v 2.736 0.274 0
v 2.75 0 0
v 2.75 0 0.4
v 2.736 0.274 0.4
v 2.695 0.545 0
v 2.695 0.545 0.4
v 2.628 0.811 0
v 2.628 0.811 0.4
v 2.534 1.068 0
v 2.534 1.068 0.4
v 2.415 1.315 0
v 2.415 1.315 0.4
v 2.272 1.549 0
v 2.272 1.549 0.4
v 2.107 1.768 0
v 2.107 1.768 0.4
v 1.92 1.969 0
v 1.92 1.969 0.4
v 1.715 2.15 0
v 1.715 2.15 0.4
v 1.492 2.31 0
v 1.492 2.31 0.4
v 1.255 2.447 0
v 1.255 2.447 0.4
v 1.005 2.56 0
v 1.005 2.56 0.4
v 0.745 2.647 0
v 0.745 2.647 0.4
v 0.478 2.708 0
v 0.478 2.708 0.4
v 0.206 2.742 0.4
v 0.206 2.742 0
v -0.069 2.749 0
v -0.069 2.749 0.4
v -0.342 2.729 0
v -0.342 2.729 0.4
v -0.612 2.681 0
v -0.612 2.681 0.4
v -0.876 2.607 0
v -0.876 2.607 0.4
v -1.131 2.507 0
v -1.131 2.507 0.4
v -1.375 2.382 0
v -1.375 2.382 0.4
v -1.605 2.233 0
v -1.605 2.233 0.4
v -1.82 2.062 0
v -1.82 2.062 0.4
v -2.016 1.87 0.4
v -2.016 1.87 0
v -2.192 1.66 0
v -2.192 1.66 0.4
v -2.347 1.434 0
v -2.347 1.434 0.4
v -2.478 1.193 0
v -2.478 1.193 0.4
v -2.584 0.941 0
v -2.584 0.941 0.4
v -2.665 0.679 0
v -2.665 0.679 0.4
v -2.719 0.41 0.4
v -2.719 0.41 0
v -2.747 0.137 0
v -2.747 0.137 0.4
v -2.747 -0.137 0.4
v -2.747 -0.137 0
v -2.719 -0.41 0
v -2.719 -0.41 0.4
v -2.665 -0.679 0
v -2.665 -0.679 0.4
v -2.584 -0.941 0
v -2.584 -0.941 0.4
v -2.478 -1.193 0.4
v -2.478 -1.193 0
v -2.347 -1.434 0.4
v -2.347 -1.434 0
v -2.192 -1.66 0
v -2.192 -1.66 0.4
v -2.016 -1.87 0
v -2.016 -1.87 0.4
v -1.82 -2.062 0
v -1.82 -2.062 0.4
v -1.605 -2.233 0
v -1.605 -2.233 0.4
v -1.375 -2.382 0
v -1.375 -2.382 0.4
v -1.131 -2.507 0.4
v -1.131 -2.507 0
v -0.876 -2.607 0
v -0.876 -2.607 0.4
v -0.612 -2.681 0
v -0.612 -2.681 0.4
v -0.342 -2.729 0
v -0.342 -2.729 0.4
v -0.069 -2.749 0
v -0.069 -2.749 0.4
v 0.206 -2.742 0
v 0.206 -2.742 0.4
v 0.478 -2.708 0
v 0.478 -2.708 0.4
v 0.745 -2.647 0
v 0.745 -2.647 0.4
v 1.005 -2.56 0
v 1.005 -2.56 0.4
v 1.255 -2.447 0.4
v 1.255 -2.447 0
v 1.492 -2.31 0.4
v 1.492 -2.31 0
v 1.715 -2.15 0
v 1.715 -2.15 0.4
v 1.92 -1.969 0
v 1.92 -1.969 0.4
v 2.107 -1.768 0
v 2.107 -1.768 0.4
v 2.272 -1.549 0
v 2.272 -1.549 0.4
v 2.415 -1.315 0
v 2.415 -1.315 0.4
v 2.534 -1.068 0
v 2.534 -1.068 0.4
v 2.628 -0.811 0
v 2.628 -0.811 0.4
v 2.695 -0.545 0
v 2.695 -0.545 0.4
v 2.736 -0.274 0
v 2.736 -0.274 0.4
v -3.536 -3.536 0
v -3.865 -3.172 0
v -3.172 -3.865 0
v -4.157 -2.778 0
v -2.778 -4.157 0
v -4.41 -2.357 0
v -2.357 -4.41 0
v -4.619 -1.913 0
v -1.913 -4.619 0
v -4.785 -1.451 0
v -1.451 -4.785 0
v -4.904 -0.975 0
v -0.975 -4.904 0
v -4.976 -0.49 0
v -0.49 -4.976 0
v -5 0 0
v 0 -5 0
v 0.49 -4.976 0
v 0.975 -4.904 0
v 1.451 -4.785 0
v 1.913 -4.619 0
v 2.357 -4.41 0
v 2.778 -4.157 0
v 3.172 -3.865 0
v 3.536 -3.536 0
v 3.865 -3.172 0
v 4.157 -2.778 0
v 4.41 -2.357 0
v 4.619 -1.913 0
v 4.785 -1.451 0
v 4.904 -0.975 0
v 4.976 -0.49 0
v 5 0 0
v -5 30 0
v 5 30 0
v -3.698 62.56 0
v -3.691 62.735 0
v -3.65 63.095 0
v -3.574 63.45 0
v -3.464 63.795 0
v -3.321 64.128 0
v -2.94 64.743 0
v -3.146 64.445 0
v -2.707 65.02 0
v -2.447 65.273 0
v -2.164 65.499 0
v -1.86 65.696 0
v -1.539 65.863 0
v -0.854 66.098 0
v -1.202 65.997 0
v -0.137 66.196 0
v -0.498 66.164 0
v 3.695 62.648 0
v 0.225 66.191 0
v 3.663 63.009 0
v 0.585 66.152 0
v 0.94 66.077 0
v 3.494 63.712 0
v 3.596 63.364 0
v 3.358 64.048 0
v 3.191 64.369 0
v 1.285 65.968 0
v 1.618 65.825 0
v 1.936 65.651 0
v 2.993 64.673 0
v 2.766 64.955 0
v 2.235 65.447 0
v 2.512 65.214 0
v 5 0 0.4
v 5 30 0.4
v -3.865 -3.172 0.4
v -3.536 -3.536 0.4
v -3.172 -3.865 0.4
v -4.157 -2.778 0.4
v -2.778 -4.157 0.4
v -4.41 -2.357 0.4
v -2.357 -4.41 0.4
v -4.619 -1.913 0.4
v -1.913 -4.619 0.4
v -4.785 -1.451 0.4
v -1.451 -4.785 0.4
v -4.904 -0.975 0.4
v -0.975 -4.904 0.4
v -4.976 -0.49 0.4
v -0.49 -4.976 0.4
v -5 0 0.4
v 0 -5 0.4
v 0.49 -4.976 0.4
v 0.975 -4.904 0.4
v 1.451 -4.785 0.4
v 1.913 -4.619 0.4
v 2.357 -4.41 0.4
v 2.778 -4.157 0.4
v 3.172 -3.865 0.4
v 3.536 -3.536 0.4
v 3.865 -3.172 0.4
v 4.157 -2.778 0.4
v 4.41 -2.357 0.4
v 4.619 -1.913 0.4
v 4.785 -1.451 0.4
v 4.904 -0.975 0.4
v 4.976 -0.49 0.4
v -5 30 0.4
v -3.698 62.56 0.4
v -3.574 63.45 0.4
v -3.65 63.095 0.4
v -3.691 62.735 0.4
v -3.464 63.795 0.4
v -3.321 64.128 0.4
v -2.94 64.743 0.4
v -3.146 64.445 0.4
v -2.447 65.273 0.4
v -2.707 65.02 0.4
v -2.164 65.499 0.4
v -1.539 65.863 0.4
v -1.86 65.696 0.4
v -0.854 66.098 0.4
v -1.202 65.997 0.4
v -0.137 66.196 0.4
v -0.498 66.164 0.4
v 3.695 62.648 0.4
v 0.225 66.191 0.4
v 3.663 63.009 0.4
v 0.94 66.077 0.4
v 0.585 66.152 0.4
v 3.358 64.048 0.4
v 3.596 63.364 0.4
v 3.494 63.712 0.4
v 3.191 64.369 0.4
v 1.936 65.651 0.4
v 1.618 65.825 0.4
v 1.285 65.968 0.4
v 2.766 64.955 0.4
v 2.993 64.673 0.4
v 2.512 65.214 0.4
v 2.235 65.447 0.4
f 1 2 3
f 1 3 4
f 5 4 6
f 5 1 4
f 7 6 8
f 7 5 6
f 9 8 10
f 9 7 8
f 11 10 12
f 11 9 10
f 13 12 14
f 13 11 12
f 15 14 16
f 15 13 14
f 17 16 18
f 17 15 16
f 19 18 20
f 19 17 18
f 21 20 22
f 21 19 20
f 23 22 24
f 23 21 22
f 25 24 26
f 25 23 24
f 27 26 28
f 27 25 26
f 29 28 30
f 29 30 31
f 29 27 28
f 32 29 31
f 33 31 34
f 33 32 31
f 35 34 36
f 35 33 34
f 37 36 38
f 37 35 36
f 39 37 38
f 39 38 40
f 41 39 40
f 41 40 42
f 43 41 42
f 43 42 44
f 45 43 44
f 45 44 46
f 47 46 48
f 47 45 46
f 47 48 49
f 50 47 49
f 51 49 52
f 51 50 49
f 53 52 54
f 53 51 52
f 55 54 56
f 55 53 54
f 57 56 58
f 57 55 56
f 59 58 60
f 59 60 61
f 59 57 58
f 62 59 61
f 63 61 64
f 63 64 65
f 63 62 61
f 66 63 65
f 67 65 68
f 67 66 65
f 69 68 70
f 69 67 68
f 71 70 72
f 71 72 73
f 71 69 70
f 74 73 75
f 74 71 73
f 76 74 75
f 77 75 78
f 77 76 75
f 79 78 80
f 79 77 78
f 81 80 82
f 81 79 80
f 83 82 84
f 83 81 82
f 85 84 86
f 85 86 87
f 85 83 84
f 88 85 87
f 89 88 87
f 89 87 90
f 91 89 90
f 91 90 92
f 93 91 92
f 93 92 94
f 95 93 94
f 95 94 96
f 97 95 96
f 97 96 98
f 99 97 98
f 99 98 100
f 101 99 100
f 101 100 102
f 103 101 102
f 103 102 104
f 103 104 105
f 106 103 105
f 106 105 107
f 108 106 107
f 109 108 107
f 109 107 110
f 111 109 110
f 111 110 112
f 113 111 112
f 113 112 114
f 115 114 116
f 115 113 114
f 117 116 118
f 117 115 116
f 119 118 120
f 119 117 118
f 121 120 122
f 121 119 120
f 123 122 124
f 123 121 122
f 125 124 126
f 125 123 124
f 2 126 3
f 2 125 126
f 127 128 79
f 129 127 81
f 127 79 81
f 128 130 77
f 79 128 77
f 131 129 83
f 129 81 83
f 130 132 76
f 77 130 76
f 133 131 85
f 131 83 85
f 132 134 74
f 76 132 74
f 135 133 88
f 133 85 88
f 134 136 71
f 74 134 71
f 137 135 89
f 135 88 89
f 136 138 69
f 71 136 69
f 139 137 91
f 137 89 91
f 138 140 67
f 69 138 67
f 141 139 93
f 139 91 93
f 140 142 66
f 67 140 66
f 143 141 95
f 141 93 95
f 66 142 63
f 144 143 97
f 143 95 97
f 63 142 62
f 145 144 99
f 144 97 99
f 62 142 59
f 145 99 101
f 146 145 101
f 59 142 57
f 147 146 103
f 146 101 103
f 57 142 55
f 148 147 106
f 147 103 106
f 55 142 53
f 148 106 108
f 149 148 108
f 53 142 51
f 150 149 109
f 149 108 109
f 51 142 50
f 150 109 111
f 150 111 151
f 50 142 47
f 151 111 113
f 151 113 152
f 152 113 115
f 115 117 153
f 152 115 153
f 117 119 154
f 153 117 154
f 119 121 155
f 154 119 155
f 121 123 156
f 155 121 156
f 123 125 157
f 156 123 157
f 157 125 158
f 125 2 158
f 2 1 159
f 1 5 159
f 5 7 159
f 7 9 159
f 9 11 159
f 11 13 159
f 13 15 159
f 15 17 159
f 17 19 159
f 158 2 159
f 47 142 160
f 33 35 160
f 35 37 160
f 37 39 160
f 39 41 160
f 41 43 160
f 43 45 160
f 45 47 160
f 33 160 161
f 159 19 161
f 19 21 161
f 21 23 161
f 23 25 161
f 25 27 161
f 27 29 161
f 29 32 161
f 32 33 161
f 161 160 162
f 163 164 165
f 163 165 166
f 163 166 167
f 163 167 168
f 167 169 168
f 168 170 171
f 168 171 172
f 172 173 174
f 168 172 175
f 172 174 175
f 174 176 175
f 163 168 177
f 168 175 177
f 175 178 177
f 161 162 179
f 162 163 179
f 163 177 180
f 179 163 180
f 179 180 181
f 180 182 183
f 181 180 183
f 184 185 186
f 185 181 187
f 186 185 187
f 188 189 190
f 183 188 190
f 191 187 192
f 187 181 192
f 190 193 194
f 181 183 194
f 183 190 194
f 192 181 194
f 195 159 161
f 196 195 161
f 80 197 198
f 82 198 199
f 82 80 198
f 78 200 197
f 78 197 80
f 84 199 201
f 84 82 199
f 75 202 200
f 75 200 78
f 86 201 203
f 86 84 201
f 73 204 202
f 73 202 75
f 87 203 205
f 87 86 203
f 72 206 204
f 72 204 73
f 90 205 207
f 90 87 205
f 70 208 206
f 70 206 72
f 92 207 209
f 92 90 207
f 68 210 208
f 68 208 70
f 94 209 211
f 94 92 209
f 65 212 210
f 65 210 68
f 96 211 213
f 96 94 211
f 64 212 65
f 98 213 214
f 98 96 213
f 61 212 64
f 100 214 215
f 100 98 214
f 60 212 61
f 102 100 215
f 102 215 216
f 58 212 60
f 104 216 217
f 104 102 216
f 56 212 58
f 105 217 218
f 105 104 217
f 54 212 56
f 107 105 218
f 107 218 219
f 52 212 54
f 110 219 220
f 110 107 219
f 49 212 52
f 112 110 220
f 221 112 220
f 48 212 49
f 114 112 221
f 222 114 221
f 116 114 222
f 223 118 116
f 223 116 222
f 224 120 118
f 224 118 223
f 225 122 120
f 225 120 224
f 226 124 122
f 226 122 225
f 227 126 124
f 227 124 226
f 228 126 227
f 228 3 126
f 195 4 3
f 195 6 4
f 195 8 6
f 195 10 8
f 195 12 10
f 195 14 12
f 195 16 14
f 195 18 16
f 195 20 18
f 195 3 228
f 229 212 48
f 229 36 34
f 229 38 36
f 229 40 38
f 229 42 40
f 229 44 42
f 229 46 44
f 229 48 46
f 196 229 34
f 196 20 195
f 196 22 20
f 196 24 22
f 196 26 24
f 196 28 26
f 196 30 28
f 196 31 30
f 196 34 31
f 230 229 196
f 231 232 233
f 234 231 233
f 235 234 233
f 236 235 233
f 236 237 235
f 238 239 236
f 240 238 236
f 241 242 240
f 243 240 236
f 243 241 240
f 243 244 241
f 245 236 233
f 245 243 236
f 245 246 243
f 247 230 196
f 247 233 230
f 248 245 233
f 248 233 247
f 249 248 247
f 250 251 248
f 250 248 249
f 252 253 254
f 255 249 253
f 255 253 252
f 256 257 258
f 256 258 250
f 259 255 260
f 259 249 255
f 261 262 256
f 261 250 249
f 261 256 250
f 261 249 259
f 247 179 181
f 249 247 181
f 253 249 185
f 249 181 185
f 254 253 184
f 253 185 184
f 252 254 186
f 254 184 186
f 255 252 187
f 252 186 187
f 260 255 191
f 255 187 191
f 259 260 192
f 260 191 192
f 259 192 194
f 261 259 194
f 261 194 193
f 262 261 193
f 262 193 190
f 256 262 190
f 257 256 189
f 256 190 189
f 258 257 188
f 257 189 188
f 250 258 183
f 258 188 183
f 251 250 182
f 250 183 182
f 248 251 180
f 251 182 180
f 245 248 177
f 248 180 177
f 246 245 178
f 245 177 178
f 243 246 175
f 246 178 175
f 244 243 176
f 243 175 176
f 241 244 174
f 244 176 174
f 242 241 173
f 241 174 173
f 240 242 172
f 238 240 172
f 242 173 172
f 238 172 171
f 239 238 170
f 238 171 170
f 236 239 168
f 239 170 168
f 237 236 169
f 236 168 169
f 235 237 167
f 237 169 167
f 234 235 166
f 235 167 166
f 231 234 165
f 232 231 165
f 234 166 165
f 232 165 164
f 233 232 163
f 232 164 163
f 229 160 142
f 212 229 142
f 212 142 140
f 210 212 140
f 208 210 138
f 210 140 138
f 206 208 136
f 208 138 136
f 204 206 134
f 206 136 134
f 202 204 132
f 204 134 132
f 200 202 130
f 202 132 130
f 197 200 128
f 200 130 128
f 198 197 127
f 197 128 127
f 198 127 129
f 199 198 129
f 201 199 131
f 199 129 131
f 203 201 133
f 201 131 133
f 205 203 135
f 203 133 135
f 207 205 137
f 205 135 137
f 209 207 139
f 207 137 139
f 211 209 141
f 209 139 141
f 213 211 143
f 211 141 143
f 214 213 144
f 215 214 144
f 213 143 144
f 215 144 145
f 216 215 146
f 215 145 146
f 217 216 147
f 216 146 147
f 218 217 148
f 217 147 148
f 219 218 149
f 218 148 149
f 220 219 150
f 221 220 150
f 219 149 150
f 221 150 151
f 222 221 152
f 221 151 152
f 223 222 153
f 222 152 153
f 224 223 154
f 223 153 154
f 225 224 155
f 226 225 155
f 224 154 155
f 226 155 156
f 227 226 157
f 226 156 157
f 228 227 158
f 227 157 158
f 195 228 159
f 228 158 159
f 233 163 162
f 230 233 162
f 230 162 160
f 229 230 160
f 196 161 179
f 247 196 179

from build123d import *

# Parameters (mm, degrees)
F0_R     = 2.75
F1_DEPTH = 0.4


with BuildPart() as f1:
    # F0 (on Top) → F1 (new body)
    with BuildSketch(Plane.XY):
        with BuildLine():
            Line((-5, 30), (-5, 0))
            ThreePointArc((-5, 0), (0, -5), (5, 0))
            Line((5, 0), (5, 30))
            Line((5, 30), (3.695135, 62.647687))
            ThreePointArc((3.695135, 62.647687), (0.043949, 66.197824), (-3.690581, 62.735468))
            Line((-3.690581, 62.735468), (-3.697598, 62.560059))
            Line((-3.697598, 62.560059), (-5, 30))
        make_face()
        Circle(F0_R, mode=Mode.SUBTRACT)
    extrude(amount=F1_DEPTH)


solid = f1.part
